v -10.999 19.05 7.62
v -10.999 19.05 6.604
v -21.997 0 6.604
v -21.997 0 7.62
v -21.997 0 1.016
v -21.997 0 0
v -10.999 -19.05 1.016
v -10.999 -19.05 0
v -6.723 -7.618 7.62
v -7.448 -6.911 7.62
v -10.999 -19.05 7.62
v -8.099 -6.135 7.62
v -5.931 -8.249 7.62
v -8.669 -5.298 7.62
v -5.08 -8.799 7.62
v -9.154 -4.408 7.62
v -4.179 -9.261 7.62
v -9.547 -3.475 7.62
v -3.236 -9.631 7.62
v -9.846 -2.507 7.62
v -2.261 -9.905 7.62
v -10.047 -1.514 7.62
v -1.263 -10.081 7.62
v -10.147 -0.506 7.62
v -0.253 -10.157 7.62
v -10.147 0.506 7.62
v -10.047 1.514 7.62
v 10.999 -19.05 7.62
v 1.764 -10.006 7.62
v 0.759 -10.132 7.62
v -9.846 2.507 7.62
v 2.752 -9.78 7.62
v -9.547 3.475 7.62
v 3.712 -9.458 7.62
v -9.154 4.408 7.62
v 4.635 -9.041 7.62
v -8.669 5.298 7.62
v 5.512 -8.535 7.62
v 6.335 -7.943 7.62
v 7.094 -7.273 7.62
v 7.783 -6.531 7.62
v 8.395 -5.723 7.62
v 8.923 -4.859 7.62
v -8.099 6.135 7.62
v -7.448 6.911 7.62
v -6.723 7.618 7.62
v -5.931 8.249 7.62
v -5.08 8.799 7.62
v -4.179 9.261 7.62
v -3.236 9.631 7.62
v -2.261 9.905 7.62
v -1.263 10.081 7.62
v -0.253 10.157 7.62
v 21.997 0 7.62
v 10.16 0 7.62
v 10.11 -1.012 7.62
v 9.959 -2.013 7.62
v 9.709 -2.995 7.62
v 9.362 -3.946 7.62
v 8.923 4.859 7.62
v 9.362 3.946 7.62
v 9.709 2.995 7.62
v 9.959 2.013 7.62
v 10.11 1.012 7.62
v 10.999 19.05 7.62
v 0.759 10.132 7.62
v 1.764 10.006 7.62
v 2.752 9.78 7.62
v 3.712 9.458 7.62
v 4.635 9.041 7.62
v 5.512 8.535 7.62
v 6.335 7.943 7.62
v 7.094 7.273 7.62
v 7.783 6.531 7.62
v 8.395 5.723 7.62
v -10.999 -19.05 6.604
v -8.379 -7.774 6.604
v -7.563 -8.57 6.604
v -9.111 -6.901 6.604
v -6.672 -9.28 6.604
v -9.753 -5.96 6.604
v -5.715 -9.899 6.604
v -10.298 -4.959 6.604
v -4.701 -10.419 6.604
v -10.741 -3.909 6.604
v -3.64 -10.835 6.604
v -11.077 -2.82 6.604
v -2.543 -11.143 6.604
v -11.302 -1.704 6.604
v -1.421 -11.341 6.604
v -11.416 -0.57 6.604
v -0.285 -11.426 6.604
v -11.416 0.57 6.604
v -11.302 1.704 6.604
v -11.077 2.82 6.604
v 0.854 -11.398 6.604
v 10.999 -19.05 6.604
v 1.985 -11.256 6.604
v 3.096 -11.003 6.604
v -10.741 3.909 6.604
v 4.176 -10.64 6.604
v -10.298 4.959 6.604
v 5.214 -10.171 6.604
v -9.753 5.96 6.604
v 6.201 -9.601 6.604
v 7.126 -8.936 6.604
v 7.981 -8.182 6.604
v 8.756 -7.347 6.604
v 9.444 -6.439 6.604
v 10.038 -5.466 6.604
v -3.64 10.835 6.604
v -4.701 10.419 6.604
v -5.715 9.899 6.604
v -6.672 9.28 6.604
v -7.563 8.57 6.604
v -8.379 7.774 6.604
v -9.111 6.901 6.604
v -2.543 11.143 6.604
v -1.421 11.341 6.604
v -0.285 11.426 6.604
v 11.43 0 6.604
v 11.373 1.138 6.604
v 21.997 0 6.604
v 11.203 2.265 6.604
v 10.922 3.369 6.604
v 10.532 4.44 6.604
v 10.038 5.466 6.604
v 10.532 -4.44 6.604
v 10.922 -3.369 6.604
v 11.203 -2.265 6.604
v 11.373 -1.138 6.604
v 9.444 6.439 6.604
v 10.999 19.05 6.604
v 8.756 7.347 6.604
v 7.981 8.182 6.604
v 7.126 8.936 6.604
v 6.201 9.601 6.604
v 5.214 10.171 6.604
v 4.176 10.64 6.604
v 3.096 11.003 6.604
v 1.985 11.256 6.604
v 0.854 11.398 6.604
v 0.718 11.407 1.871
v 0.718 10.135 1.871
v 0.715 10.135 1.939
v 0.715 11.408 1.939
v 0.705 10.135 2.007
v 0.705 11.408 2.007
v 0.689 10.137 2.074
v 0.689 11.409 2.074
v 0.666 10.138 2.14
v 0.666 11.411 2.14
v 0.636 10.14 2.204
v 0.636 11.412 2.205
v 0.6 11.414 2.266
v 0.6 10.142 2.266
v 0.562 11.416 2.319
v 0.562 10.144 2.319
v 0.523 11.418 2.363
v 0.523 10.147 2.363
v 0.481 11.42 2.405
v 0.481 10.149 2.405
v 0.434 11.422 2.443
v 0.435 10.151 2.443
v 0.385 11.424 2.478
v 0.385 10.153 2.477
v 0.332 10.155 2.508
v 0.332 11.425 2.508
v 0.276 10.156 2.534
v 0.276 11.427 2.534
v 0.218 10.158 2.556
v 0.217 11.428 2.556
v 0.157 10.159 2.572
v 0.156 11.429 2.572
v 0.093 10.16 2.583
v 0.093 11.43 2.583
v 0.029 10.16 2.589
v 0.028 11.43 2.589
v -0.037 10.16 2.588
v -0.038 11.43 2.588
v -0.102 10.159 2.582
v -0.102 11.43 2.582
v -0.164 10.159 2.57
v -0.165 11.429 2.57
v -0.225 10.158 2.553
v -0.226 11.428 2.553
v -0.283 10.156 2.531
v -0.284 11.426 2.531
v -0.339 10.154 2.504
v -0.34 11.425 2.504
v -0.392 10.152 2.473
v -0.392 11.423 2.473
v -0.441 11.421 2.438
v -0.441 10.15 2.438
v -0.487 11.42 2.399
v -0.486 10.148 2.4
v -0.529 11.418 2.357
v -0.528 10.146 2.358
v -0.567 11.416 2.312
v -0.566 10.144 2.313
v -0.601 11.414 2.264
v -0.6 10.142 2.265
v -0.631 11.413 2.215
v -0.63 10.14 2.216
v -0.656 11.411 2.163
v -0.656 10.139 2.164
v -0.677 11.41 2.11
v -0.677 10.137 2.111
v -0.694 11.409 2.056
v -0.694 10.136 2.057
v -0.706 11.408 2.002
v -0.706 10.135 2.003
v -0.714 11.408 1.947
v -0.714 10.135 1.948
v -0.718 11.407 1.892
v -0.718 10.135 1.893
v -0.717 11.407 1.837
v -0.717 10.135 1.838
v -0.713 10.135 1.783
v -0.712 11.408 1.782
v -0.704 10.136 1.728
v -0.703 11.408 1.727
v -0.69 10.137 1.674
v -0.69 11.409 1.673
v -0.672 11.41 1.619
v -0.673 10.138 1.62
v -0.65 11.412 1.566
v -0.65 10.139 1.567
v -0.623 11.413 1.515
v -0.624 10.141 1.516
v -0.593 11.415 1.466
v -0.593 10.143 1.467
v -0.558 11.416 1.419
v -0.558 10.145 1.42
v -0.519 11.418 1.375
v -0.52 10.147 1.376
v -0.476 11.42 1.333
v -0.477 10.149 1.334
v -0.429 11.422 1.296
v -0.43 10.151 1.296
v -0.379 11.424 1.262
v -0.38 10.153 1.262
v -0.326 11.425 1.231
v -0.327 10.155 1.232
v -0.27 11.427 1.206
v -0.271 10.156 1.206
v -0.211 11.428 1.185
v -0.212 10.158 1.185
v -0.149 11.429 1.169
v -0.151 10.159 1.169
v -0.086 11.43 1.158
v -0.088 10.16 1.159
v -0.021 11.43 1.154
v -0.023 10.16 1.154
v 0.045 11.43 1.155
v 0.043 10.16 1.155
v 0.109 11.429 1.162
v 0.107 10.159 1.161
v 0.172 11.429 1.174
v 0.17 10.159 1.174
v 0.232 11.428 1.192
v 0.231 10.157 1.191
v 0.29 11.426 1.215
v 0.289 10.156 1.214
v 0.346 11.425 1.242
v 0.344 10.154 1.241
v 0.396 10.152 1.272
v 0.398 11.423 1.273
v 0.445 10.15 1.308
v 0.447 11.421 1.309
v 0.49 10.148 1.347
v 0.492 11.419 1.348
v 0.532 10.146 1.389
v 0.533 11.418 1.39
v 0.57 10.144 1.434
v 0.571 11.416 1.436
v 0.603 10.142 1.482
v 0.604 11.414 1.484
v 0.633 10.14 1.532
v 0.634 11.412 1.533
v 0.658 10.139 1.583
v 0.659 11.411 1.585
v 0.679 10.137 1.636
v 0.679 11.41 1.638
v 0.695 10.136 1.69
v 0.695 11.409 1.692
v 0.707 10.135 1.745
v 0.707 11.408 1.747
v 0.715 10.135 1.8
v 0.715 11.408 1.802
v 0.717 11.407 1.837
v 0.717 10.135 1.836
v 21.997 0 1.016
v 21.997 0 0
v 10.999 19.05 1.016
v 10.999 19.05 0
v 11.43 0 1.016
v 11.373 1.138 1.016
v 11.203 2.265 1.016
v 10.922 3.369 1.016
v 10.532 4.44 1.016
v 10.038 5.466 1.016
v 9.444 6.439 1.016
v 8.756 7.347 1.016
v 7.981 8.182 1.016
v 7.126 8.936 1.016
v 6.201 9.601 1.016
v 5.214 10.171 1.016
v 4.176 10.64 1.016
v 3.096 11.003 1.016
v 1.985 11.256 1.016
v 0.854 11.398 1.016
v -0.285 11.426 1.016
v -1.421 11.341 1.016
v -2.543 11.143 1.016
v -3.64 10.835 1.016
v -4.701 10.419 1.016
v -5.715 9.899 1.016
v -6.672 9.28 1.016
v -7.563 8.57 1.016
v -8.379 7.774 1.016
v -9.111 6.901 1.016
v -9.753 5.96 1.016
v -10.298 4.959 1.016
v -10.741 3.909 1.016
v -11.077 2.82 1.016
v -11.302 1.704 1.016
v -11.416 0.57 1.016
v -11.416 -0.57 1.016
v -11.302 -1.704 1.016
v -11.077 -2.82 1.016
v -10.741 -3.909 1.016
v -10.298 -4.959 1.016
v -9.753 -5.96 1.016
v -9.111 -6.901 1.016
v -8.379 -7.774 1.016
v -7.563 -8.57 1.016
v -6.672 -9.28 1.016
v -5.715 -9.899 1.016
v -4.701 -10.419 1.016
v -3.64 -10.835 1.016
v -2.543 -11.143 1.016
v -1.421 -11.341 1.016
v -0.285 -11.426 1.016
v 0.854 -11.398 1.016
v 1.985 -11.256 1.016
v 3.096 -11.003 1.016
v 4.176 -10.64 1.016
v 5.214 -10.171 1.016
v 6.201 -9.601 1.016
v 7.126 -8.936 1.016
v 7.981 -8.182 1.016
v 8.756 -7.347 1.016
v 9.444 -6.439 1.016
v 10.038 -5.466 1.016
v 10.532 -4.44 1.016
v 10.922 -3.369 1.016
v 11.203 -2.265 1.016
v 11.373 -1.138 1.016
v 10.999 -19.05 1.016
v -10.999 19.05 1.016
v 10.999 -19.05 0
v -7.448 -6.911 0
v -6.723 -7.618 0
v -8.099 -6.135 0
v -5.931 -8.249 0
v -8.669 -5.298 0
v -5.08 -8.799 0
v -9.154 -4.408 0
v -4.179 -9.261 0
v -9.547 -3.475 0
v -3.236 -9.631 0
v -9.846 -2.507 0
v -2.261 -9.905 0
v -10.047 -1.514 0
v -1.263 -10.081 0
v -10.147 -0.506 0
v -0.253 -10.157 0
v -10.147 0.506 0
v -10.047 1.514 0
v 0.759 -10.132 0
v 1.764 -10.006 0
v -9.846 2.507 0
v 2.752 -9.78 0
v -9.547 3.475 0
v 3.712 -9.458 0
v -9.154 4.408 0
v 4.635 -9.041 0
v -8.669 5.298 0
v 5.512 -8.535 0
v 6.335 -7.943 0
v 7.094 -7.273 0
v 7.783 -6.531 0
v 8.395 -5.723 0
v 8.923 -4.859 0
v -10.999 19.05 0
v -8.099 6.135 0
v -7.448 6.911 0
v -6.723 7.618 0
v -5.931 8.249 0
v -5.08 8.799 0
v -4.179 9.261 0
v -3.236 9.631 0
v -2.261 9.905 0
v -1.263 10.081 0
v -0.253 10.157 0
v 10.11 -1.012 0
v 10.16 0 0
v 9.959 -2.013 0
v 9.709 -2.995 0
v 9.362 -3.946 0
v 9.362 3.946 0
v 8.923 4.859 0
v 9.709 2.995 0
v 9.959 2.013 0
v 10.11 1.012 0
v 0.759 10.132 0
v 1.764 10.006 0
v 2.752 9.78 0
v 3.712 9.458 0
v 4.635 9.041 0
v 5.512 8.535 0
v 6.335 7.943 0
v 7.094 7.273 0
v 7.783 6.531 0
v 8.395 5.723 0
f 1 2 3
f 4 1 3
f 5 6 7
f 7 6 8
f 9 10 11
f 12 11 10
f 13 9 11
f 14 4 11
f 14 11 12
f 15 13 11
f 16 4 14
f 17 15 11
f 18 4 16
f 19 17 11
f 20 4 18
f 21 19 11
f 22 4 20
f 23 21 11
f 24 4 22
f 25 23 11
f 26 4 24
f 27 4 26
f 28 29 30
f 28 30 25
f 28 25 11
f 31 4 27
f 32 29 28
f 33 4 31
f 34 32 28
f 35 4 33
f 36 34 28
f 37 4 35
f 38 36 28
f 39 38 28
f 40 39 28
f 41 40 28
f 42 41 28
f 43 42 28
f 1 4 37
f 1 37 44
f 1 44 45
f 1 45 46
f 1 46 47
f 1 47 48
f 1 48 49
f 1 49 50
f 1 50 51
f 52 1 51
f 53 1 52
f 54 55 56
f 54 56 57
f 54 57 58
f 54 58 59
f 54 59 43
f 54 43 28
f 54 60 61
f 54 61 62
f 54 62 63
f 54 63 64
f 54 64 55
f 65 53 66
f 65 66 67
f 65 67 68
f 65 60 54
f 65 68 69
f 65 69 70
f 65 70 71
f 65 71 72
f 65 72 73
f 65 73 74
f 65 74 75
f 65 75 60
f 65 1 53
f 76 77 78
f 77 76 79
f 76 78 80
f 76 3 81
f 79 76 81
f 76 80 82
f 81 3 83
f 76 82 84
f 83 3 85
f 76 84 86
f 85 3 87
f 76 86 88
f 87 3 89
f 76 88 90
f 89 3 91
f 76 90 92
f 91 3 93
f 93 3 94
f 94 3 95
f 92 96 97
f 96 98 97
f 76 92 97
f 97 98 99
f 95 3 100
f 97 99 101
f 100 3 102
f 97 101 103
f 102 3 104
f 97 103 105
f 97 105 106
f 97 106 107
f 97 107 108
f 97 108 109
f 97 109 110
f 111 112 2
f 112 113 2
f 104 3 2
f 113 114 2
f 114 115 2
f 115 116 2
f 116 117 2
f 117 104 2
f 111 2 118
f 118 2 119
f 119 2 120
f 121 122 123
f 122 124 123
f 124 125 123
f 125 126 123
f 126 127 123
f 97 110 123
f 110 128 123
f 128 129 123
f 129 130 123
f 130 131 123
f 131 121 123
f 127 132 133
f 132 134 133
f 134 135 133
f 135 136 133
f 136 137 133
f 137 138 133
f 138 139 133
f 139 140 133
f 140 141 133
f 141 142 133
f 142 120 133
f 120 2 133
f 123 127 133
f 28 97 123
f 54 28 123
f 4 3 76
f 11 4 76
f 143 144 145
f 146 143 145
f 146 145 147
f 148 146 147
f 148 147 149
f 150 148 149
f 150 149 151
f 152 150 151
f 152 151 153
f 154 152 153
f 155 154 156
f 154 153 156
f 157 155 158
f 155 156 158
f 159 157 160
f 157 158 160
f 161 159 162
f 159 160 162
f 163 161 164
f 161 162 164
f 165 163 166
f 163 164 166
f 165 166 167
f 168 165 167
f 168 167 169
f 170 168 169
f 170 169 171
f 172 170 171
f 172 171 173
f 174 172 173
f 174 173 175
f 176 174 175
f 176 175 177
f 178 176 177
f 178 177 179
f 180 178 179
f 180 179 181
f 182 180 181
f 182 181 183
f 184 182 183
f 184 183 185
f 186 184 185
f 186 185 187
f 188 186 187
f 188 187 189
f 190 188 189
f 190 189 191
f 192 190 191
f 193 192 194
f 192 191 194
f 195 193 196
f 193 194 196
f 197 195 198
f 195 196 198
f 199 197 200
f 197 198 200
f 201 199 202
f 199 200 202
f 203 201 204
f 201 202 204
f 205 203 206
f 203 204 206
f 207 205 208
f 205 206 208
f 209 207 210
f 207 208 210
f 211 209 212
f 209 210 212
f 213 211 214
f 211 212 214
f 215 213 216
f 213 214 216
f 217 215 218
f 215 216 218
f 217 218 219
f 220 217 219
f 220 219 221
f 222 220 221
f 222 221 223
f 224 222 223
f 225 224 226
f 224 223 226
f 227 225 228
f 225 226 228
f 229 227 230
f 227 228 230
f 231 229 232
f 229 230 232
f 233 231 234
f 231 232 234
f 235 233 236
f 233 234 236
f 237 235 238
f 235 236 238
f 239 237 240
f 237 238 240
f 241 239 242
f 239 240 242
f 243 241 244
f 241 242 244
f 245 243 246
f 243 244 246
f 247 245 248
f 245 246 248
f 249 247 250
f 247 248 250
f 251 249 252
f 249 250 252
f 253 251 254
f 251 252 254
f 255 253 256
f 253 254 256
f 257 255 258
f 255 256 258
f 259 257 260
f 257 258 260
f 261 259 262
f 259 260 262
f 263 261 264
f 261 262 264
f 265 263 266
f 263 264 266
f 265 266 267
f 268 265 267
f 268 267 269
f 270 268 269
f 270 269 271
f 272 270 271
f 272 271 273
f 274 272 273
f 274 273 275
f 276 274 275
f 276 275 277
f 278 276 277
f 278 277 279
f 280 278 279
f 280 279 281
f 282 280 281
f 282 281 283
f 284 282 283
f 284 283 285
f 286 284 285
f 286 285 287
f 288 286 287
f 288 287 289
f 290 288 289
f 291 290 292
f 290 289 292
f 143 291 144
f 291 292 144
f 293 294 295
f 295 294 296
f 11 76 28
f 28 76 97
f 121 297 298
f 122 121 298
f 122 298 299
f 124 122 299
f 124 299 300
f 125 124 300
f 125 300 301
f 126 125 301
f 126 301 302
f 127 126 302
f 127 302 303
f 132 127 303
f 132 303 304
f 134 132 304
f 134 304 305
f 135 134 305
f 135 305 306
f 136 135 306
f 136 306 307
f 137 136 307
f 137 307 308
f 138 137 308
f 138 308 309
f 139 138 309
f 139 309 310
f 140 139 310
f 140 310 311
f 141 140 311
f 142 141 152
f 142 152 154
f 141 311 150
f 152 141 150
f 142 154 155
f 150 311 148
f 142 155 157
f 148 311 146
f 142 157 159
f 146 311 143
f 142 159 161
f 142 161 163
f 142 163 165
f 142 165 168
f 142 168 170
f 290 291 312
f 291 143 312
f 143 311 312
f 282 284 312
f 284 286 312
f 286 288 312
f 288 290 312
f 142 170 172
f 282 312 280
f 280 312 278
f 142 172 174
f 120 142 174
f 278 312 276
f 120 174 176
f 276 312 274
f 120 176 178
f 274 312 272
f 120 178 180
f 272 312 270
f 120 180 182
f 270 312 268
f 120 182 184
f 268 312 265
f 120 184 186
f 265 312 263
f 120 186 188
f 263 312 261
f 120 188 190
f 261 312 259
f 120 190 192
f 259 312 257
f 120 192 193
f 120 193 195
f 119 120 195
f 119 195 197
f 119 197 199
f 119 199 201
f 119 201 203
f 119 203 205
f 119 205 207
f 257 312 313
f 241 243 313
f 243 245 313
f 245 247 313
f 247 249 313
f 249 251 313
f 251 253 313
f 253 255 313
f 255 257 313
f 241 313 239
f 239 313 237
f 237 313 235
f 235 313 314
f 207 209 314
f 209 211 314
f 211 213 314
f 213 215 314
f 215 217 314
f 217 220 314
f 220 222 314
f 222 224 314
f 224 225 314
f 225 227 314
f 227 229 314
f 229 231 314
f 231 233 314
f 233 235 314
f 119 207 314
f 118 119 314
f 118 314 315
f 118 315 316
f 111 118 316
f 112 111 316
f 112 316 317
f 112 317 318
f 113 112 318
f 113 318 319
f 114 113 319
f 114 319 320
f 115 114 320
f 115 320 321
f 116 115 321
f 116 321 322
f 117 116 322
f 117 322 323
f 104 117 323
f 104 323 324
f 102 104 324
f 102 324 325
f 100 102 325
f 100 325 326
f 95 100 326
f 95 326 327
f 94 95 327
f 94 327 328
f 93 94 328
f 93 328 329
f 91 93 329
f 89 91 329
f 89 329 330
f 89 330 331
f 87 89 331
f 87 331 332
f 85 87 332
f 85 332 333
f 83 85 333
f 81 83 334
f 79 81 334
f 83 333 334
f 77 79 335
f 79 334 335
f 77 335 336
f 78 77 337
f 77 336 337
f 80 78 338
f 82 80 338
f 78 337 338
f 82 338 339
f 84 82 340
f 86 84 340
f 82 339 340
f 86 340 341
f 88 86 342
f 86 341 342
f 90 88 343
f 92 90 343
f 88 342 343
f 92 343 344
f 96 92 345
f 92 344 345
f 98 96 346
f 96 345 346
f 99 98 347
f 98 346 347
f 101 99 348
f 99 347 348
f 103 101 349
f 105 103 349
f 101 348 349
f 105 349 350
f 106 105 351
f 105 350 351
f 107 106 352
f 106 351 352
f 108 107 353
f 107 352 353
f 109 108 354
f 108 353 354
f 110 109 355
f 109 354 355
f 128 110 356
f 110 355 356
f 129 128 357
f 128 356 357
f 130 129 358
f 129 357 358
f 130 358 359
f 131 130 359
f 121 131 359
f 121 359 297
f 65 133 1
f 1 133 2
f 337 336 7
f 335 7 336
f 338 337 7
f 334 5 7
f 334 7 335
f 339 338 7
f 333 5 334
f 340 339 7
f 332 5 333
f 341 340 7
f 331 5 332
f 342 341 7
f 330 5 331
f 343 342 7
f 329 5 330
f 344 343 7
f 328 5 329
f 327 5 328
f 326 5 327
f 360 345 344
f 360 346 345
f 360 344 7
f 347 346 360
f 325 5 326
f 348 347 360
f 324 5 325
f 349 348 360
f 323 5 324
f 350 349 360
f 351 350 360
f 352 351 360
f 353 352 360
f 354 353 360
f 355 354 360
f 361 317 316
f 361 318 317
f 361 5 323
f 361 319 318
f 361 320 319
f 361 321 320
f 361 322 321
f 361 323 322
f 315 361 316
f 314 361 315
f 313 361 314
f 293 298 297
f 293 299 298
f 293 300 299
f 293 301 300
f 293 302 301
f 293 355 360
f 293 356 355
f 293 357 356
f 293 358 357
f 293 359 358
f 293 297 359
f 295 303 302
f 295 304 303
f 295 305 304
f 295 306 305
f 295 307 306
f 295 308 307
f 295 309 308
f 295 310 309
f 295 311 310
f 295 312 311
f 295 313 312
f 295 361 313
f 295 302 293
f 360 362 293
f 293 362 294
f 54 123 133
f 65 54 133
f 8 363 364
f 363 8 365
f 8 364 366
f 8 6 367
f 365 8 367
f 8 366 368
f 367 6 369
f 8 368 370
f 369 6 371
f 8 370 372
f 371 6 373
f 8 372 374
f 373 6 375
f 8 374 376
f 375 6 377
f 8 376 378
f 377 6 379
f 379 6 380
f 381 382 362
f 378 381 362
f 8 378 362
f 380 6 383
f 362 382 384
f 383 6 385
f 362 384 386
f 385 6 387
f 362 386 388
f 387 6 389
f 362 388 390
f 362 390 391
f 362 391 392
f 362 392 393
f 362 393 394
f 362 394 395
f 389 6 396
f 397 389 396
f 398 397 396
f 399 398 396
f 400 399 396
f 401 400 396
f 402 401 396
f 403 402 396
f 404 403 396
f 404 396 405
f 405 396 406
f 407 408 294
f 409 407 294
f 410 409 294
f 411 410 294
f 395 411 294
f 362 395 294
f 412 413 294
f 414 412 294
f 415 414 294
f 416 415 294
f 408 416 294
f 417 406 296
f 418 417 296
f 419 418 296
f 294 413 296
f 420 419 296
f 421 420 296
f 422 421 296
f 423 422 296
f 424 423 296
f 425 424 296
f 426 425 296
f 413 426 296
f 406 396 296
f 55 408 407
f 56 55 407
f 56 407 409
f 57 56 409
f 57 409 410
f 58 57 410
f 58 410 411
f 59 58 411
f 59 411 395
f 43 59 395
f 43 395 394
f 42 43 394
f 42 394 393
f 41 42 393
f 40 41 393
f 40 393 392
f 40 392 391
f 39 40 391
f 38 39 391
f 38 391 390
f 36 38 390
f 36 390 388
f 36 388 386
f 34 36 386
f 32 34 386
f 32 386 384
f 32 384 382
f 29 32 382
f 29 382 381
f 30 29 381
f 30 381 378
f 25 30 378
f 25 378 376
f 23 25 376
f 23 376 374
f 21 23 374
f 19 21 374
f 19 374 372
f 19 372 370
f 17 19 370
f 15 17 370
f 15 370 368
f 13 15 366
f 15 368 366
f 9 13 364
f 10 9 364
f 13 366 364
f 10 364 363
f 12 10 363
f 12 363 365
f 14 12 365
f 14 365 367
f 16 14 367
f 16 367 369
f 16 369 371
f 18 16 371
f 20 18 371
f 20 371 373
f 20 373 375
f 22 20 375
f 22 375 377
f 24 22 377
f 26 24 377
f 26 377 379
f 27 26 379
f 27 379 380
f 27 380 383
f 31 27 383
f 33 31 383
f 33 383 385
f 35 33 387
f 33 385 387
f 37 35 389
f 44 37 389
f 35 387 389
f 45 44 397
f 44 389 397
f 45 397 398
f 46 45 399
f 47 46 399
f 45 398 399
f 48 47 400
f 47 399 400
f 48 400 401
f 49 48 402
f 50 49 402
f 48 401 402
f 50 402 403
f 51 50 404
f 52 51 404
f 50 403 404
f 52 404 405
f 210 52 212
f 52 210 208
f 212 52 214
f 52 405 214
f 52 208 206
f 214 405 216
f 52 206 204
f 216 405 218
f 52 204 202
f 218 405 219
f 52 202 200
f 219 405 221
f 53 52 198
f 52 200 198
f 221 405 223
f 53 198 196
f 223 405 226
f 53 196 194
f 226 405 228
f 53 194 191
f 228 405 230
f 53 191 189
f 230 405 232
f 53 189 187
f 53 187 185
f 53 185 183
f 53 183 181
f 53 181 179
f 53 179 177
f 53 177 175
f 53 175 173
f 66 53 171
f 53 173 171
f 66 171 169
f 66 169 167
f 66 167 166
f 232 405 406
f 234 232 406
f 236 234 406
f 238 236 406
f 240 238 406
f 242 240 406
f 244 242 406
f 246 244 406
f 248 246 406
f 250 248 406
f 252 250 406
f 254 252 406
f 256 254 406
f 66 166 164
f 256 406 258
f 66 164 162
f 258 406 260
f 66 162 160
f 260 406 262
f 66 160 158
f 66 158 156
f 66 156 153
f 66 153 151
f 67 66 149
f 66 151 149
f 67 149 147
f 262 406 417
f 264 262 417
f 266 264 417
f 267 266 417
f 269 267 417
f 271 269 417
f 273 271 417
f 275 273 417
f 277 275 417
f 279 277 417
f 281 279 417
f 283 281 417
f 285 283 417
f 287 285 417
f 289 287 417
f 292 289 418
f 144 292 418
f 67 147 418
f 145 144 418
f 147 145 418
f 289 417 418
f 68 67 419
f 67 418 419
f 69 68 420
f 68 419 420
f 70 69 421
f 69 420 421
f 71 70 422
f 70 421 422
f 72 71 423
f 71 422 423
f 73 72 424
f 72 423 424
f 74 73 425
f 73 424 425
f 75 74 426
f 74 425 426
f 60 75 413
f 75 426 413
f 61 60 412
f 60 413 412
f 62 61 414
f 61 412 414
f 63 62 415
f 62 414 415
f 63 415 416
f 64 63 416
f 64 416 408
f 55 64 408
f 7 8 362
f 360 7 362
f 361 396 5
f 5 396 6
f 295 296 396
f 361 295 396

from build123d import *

# Parameters (mm, degrees)
F1_DEPTH = 7.62
F2_R     = 10.16
F3_DEPTH = 25.4
F5_R     = 11.43
F6_DEPTH = 5.588
F7_R     = 0.718054
F8_DEPTH = 25.4


with BuildPart() as f1:
    # F0 (on Top) → F1 (new body)
    with BuildSketch(Plane.XY):
        Polygon((10.998523, 19.05), (-10.998523, 19.05), (-21.997045, 0), (-10.998523, -19.05), (10.998523, -19.05), (21.997045, 0), align=None)
    extrude(amount=F1_DEPTH)

    # F2 (on face) → F3 (cut)
    with BuildSketch(Plane(origin=(0, 0, 0), x_dir=(1, 0, 0), z_dir=(0, 0, -1))):
        Circle(F2_R)
    extrude(amount=-F3_DEPTH, mode=Mode.SUBTRACT)

    # F5 (on offset) → F6 (cut)
    with BuildSketch(Plane.XY.offset(1.016)):
        Polygon((10.998523, -19.05), (21.997045, 0), (10.998523, 19.05), (-10.998523, 19.05), (-21.997045, 0), (-10.998523, -19.05), align=None)
        Circle(F5_R, mode=Mode.SUBTRACT)
    extrude(amount=F6_DEPTH, mode=Mode.SUBTRACT)

    # F7 (on Front) → F8 (cut)
    with BuildSketch(Plane.XZ):
        with Locations((0, 1.871332)):
            Circle(F7_R)
    extrude(amount=-F8_DEPTH, mode=Mode.SUBTRACT)


solid = f1.part
